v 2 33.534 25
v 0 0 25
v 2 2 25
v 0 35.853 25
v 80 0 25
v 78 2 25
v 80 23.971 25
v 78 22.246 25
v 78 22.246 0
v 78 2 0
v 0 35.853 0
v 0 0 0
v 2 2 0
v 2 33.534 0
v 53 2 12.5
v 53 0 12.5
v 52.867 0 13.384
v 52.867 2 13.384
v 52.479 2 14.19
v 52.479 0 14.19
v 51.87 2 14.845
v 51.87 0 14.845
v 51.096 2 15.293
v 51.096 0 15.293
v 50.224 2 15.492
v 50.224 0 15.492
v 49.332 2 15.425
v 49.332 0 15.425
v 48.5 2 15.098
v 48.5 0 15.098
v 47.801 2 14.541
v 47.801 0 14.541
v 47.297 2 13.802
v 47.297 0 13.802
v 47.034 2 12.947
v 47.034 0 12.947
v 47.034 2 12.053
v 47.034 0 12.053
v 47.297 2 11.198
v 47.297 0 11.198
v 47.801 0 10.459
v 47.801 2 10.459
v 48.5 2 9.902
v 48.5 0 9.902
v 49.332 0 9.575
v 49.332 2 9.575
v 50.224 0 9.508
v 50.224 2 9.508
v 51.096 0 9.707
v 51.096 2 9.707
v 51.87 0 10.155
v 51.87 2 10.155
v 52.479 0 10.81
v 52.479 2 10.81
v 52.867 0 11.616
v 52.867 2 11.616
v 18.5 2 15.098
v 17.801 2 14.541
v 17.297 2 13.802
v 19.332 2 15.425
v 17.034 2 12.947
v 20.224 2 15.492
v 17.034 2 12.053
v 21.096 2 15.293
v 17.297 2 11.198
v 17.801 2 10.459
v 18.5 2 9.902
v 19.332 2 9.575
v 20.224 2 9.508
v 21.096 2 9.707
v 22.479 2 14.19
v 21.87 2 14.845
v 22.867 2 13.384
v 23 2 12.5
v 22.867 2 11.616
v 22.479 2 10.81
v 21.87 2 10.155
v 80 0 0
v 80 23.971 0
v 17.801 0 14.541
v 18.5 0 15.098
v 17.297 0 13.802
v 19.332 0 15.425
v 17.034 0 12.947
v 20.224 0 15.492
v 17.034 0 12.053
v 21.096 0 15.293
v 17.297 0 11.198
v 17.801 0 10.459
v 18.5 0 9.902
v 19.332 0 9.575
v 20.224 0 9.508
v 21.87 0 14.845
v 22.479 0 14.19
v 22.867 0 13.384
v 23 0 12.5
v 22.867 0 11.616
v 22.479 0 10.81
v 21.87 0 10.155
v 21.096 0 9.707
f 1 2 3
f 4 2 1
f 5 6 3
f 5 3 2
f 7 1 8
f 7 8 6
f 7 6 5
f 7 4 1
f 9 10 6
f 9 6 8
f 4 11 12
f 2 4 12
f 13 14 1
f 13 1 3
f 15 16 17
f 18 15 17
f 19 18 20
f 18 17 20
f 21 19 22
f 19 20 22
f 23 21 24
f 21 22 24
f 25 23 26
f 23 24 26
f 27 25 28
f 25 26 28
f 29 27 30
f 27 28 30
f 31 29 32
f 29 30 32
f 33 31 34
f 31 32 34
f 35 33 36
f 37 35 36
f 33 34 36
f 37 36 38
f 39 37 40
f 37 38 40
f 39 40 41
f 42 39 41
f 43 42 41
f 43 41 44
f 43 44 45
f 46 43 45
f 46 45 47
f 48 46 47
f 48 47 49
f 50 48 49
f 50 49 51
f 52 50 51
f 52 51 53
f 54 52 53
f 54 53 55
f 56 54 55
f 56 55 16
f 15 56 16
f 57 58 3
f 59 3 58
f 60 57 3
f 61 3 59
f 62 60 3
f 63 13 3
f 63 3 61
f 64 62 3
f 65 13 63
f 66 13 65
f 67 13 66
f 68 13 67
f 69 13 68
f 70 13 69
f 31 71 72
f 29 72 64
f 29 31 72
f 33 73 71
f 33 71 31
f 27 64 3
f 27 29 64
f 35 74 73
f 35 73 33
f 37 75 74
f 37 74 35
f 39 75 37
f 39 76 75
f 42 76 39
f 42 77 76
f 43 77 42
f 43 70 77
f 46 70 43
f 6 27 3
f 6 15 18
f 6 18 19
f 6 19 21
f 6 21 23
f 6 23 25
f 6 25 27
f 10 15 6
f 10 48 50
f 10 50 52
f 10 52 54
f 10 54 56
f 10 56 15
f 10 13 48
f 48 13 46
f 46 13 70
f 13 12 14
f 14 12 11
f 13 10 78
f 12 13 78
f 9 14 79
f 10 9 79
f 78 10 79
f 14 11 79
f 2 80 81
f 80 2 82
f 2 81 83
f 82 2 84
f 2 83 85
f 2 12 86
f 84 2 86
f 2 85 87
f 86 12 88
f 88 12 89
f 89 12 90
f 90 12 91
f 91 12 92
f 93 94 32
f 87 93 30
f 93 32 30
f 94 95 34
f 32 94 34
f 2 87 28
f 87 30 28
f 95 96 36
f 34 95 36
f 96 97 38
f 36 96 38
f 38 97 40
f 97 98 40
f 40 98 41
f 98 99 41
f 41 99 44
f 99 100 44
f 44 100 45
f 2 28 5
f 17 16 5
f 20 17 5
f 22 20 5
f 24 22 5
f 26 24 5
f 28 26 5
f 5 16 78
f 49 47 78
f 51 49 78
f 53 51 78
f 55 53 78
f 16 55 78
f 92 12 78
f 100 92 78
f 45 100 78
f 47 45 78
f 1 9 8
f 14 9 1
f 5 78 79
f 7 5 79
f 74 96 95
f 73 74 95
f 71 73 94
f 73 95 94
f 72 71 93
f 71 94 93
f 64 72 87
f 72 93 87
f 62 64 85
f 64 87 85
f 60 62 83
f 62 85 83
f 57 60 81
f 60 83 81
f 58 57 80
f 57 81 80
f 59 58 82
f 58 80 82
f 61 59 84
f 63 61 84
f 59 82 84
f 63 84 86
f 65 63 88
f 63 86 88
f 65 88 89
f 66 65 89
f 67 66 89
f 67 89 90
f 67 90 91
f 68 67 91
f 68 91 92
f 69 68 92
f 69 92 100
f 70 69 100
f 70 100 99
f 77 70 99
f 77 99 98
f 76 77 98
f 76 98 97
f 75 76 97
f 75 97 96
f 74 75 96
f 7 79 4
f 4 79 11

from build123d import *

# Parameters (mm, degrees)
BOSS_EXTRUDE1_DEPTH = 25
SKETCH4_R           = 3
CUT_EXTRUDE1_DEPTH  = 17


with BuildPart() as part:
    # Sketch3 → Boss-Extrude1 (new body)
    with BuildSketch(Plane.XY):
        Polygon((0, 35.853266996), (0, 0), (80, 0), (80, 23.970502896), align=None)
        Polygon((2, 33.534255745), (2, 2), (78, 2), (78, 22.24562985), align=None, mode=Mode.SUBTRACT)
    extrude(amount=BOSS_EXTRUDE1_DEPTH)

    # Sketch4 → Cut-Extrude1 (cut)
    with BuildSketch(Plane.XZ):
        with Locations((20, 12.5)):
            Circle(SKETCH4_R)
        with Locations((50, 12.5)):
            Circle(SKETCH4_R)
    extrude(amount=-CUT_EXTRUDE1_DEPTH, mode=Mode.SUBTRACT)


solid = part.part
